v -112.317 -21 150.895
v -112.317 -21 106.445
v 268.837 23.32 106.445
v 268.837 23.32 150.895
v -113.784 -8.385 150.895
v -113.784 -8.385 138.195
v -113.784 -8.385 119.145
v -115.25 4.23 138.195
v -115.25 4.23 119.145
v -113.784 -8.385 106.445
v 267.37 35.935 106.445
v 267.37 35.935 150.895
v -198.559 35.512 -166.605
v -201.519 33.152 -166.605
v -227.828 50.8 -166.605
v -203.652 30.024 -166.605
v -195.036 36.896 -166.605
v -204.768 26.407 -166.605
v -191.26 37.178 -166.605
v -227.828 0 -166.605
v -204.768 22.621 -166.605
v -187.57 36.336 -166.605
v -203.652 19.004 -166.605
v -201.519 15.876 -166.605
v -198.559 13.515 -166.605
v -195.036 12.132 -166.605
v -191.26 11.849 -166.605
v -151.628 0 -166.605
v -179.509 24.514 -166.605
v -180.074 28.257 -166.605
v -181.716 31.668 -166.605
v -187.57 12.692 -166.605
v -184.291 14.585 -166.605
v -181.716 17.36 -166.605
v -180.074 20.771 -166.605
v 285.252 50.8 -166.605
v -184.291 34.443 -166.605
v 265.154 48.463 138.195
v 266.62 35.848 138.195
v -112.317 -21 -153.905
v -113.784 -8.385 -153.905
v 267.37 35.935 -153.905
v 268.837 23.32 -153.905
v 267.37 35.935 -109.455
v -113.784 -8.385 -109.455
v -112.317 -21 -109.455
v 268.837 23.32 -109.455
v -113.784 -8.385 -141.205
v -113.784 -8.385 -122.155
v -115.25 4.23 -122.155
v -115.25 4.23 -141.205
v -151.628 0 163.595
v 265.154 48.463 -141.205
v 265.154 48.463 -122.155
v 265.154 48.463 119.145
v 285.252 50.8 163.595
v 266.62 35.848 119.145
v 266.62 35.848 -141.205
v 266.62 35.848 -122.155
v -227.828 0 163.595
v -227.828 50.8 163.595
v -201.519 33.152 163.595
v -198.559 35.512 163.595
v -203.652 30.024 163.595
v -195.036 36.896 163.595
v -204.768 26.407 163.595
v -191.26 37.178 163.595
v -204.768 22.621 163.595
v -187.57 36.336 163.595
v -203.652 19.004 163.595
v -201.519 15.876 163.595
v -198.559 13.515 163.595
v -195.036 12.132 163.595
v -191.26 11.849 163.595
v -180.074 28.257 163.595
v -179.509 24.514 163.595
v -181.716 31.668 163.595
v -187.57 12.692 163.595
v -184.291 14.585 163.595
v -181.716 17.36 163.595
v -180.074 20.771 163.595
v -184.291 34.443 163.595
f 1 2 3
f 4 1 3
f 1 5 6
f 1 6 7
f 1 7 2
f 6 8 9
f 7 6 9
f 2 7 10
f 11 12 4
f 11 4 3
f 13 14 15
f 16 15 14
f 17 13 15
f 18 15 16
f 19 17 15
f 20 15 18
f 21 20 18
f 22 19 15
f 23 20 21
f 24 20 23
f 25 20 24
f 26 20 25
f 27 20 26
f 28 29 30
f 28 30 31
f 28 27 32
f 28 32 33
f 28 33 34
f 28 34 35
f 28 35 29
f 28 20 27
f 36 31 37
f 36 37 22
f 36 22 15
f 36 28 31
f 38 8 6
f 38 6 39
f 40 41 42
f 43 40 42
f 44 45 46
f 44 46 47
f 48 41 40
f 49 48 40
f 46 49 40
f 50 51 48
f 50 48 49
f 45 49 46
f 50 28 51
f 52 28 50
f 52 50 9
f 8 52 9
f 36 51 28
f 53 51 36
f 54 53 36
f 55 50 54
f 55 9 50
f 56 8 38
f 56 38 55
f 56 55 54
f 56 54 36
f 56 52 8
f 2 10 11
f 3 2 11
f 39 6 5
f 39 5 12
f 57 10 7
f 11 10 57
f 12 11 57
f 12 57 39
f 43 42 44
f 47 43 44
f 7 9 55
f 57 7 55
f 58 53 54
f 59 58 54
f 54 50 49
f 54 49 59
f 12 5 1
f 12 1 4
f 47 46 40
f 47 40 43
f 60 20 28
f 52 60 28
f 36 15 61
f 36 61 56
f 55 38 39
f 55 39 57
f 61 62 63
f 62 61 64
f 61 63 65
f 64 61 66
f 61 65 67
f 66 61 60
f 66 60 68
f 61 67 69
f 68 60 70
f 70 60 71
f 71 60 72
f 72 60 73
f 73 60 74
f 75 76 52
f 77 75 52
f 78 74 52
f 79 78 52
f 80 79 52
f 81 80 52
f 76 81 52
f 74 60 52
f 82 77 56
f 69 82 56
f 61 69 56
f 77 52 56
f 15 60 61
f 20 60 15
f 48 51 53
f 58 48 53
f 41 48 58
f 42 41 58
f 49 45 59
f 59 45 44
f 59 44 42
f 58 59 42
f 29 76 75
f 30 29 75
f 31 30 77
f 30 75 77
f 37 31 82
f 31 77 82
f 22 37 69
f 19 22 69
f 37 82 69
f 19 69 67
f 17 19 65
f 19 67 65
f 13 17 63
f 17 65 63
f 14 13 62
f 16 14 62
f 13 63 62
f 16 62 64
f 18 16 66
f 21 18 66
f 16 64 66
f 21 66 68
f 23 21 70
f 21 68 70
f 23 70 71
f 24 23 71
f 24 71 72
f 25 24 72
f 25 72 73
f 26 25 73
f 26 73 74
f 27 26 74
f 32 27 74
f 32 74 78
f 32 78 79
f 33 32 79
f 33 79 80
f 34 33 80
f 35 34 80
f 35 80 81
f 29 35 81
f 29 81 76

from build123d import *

# Parameters (mm, degrees)
SKETCH1_W           = 513.08
SKETCH1_H           = 330.2
BOSS_EXTRUDE1_DEPTH = 50.8
SKETCH2_R           = 12.7
CUT_EXTRUDE1_DEPTH  = 331.2
SKETCH3_W           = 382.967058901
SKETCH3_H           = 19.05
BOSS_EXTRUDE2_DEPTH = 12.7
SKETCH4_W           = 383.722022032
SKETCH4_H           = 44.45
BOSS_EXTRUDE3_DEPTH = 12.7


with BuildPart() as part:
    # Sketch1 → Boss-Extrude1 (new body)
    with BuildSketch(Plane(origin=(0, 0, 0), x_dir=(1, 0, 0), z_dir=(0, 1, 0))):
        with Locations((28.712036474, 1.505471125)):
            Rectangle(SKETCH1_W, SKETCH1_H)
    extrude(amount=BOSS_EXTRUDE1_DEPTH)

    # Sketch2 → Cut-Extrude1 (cut, through all)
    with BuildSketch(Plane.XY.offset(163.594528875)):
        with Locations((-192.209486062, 24.51392069)):
            Circle(SKETCH2_R)
        Polygon((-151.627963526, 0), (285.252036474, 50.8), (285.252036474, 0), align=None)
    extrude(amount=-CUT_EXTRUDE1_DEPTH, mode=Mode.SUBTRACT)

    # Sketch3 → Boss-Extrude2 (add)
    with BuildSketch(Plane(origin=(-2.022784999, 17.395950991, 0), x_dir=(0.99330738, 0.115500858, 0), z_dir=(0.115500858, -0.99330738, 0))):
        with Locations((77.492959748, -131.680471125)):
            Rectangle(SKETCH3_W, SKETCH3_H)
    boss_extrude2 = extrude(amount=BOSS_EXTRUDE2_DEPTH)

    # Sketch4 → Boss-Extrude3 (add)
    with BuildSketch(Plane(origin=(-0.5559241, 4.780947262, 0), x_dir=(0.99330738, 0.115500858, 0), z_dir=(0.115500858, -0.99330738, 0))):
        with Locations((77.870441313, -131.680471125)):
            Rectangle(SKETCH4_W, SKETCH4_H)
    boss_extrude3 = extrude(amount=BOSS_EXTRUDE3_DEPTH)

    # Mirror1: Boss-Extrude2, Boss-Extrude3 across plane
    add(boss_extrude2.mirror(Plane.XY.offset(-1.505471125)))
    add(boss_extrude3.mirror(Plane.XY.offset(-1.505471125)))


solid = part.part
